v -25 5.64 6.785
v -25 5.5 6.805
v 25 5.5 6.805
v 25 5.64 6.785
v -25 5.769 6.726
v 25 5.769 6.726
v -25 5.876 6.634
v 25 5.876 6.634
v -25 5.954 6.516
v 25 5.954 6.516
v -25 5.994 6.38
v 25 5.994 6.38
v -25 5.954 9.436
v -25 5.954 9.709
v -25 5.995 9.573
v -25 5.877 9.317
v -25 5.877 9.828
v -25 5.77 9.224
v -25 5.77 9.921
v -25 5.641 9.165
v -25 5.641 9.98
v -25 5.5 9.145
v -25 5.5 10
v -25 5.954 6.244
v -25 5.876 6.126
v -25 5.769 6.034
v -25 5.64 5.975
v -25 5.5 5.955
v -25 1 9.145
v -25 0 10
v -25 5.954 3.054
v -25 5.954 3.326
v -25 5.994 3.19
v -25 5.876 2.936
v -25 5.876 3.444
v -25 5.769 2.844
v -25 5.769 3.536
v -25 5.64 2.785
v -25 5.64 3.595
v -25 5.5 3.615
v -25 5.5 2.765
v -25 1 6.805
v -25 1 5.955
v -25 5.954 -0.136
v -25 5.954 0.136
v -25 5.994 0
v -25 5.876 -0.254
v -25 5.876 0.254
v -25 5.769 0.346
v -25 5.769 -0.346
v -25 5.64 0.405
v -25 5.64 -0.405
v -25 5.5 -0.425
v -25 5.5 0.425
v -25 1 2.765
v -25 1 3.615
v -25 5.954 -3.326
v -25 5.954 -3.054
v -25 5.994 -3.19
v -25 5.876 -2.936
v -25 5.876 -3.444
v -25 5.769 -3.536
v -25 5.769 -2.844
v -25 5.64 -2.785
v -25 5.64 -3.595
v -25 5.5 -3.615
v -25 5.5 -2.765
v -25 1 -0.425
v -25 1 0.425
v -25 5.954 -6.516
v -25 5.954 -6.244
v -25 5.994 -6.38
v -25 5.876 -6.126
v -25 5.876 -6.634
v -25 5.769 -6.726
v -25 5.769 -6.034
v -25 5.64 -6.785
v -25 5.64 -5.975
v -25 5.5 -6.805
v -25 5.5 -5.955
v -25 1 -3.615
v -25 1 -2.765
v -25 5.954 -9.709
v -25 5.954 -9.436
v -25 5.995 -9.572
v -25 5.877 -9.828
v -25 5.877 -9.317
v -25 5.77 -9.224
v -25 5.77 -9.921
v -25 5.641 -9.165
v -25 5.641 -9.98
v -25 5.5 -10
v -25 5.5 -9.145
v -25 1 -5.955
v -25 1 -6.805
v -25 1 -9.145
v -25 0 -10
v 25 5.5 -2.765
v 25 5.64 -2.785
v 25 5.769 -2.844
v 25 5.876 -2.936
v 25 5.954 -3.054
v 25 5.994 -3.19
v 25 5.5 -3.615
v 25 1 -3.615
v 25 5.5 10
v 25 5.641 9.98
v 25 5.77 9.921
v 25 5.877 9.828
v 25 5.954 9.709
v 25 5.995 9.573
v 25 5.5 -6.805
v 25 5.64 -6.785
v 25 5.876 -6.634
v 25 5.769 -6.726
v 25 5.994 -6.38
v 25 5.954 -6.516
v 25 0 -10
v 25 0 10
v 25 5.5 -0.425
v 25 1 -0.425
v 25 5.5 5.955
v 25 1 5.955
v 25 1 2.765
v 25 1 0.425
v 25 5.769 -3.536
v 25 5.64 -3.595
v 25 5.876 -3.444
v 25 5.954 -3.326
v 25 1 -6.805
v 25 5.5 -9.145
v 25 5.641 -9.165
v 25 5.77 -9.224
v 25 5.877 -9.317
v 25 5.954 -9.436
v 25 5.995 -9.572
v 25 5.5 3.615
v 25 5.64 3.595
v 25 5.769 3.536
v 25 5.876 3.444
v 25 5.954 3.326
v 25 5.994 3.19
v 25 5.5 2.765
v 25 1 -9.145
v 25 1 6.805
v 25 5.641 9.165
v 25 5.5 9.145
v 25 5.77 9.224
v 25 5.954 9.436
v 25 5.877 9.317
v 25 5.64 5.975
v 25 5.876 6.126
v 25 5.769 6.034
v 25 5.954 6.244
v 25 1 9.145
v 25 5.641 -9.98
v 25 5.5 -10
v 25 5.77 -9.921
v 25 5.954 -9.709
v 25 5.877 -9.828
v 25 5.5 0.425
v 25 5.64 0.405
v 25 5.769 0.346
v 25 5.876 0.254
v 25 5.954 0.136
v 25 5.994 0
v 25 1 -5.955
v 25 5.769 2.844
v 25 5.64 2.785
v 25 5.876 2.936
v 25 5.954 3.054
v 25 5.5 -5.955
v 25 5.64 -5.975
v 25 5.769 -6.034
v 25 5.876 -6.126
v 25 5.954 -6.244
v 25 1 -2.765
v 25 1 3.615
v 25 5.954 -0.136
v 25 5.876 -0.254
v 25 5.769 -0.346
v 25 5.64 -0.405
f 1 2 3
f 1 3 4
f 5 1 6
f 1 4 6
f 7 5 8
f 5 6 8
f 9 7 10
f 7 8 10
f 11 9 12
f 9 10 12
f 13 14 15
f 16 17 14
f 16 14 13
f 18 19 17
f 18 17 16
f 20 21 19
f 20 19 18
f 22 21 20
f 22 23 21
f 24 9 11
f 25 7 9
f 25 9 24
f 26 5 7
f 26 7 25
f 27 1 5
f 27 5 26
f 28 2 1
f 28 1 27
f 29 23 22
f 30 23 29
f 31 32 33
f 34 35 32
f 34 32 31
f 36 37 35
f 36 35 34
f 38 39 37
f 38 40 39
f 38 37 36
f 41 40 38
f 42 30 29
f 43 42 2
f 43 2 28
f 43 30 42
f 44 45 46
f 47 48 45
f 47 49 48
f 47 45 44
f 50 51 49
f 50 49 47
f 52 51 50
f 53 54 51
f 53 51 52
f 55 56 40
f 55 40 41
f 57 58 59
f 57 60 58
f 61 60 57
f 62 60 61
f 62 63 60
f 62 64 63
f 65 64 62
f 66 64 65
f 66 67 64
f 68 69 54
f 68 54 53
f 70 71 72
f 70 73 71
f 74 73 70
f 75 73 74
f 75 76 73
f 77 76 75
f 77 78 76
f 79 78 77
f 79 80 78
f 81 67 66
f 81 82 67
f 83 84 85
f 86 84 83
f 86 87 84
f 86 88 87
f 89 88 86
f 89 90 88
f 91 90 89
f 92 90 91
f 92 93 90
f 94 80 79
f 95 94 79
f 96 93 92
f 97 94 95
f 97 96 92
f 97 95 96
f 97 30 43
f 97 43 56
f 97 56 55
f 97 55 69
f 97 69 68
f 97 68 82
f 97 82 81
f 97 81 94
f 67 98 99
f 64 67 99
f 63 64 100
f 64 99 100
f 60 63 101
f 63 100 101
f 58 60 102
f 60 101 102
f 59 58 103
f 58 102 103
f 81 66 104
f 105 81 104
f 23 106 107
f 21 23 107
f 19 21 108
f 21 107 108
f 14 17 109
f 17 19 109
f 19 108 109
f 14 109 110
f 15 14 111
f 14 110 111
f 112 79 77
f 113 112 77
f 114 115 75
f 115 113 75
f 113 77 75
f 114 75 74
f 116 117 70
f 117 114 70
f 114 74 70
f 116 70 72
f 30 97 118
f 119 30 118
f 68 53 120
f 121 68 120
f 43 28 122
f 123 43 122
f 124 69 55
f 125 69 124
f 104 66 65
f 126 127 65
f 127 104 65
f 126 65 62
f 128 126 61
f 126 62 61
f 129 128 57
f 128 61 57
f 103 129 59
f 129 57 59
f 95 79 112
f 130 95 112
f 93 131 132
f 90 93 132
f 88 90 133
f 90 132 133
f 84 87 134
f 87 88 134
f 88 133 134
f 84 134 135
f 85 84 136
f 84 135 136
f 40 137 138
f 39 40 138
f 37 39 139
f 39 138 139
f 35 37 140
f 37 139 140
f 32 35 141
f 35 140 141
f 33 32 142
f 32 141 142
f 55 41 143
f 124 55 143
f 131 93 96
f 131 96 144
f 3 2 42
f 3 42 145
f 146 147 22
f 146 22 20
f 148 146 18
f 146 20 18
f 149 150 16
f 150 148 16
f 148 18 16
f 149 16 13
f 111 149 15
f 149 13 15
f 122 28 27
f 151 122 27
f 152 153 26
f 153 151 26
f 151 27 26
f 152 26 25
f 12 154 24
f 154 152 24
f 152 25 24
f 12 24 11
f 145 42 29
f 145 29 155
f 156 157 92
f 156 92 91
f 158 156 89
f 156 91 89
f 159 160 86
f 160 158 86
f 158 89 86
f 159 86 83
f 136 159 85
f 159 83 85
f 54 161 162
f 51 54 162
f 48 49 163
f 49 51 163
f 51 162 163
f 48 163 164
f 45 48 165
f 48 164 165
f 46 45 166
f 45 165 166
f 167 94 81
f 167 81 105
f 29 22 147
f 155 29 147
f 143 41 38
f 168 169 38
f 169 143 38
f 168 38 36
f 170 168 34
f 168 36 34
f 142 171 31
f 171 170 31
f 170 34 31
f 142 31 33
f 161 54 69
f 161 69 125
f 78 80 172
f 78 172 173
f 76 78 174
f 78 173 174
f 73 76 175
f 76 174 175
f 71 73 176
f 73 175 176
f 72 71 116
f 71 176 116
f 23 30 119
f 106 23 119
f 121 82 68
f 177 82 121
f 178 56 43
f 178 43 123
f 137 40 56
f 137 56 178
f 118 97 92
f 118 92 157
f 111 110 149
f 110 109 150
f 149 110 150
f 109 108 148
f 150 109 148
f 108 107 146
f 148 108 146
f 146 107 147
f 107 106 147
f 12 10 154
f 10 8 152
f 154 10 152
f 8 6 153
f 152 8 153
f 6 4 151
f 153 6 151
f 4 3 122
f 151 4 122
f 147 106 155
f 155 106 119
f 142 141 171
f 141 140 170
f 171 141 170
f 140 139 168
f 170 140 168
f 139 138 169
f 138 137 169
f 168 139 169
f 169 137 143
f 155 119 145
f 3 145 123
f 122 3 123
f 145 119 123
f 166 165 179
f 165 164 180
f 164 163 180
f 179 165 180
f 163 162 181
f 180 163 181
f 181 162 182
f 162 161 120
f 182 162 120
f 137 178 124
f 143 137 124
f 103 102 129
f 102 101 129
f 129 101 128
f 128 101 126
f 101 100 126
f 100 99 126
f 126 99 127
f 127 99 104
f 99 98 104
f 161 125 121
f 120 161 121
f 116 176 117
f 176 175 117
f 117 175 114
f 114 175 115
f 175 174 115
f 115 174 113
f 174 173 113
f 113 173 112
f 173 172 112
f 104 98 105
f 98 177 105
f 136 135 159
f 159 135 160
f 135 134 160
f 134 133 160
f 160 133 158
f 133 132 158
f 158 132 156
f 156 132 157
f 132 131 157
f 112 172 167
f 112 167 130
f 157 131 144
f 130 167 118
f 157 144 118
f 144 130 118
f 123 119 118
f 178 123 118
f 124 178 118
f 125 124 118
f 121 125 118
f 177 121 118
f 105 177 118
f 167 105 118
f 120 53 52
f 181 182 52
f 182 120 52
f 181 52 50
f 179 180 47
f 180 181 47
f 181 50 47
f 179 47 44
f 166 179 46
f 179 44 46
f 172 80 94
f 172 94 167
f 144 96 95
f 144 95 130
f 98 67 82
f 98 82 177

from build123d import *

# Parameters (mm, degrees)
SKETCH_1_W          = 50
SKETCH_1_H          = 20
EXTRUDE_1_DEPTH     = 6
SKETCH_2_W          = 50
SKETCH_2_H          = 2.34
CUT_EXTRUDE_1_DEPTH = 5
FILLET_1_R          = 0.5


with BuildPart() as part:
    # 草图1 → 凸台-拉伸1 (new body)
    with BuildSketch(Plane(origin=(0, 0, 0), x_dir=(1, 0, 0), z_dir=(0, 1, 0))):
        Rectangle(SKETCH_1_W, SKETCH_1_H)
    extrude(amount=EXTRUDE_1_DEPTH)

    # 草图2 → 切除-拉伸1 (cut)
    with BuildSketch(Plane(origin=(0, 6, 0), x_dir=(1, 0, 0), z_dir=(0, 1, 0))):
        with Locations((0, 1.595)):
            Rectangle(SKETCH_2_W, SKETCH_2_H)
        with Locations((0, -1.595)):
            Rectangle(SKETCH_2_W, SKETCH_2_H)
        with Locations((0, 4.785)):
            Rectangle(SKETCH_2_W, SKETCH_2_H)
        with Locations((0, -4.785)):
            Rectangle(SKETCH_2_W, SKETCH_2_H)
        with Locations((0, 7.975)):
            Rectangle(SKETCH_2_W, SKETCH_2_H)
        with Locations((0, -7.975)):
            Rectangle(SKETCH_2_W, SKETCH_2_H)
    extrude(amount=-CUT_EXTRUDE_1_DEPTH, mode=Mode.SUBTRACT)

    # 圆角1
    # the kernel refuses this fillet: 0.5 mm, written as the material it takes off along each edge
    with BuildSketch(Plane(origin=(26.25, 6, 10), x_dir=(0, 0, -1), z_dir=(-1, 0, 0)), Plane(origin=(26.25, 6, 6.805), x_dir=(0, 0, -1), z_dir=(-1, 0, 0)), Plane(origin=(26.25, 6, 3.615), x_dir=(0, 0, -1), z_dir=(-1, 0, 0)), Plane(origin=(26.25, 6, 0.425), x_dir=(0, 0, -1), z_dir=(-1, 0, 0)), Plane(origin=(26.25, 6, -2.765), x_dir=(0, 0, -1), z_dir=(-1, 0, 0)), Plane(origin=(26.25, 6, -5.955), x_dir=(0, 0, -1), z_dir=(-1, 0, 0)), Plane(origin=(26.25, 6, -9.145), x_dir=(0, 0, -1), z_dir=(-1, 0, 0))) as fillet_1_piece_1:
        with BuildLine():
            CenterArc((FILLET_1_R, FILLET_1_R), FILLET_1_R, 180, 90)
            Line((0, FILLET_1_R), (0, 0))
            Line((0, 0), (FILLET_1_R, 0))
        make_face()
    extrude(amount=52.5, mode=Mode.SUBTRACT)
    with BuildSketch(Plane(origin=(-26.25, 6, -10), x_dir=(0, -1, 0), z_dir=(1, 0, 0)), Plane(origin=(-26.25, 6, 9.145), x_dir=(0, -1, 0), z_dir=(1, 0, 0)), Plane(origin=(-26.25, 6, 5.955), x_dir=(0, -1, 0), z_dir=(1, 0, 0)), Plane(origin=(-26.25, 6, 2.765), x_dir=(0, -1, 0), z_dir=(1, 0, 0)), Plane(origin=(-26.25, 6, -0.425), x_dir=(0, -1, 0), z_dir=(1, 0, 0)), Plane(origin=(-26.25, 6, -3.615), x_dir=(0, -1, 0), z_dir=(1, 0, 0)), Plane(origin=(-26.25, 6, -6.805), x_dir=(0, -1, 0), z_dir=(1, 0, 0))) as fillet_1_piece_2:
        with BuildLine():
            CenterArc((FILLET_1_R, -FILLET_1_R), FILLET_1_R, 90, 90)
            Line((0, -FILLET_1_R), (0, 0))
            Line((0, 0), (FILLET_1_R, 0))
        make_face()
    extrude(amount=52.5, mode=Mode.SUBTRACT)


solid = part.part
